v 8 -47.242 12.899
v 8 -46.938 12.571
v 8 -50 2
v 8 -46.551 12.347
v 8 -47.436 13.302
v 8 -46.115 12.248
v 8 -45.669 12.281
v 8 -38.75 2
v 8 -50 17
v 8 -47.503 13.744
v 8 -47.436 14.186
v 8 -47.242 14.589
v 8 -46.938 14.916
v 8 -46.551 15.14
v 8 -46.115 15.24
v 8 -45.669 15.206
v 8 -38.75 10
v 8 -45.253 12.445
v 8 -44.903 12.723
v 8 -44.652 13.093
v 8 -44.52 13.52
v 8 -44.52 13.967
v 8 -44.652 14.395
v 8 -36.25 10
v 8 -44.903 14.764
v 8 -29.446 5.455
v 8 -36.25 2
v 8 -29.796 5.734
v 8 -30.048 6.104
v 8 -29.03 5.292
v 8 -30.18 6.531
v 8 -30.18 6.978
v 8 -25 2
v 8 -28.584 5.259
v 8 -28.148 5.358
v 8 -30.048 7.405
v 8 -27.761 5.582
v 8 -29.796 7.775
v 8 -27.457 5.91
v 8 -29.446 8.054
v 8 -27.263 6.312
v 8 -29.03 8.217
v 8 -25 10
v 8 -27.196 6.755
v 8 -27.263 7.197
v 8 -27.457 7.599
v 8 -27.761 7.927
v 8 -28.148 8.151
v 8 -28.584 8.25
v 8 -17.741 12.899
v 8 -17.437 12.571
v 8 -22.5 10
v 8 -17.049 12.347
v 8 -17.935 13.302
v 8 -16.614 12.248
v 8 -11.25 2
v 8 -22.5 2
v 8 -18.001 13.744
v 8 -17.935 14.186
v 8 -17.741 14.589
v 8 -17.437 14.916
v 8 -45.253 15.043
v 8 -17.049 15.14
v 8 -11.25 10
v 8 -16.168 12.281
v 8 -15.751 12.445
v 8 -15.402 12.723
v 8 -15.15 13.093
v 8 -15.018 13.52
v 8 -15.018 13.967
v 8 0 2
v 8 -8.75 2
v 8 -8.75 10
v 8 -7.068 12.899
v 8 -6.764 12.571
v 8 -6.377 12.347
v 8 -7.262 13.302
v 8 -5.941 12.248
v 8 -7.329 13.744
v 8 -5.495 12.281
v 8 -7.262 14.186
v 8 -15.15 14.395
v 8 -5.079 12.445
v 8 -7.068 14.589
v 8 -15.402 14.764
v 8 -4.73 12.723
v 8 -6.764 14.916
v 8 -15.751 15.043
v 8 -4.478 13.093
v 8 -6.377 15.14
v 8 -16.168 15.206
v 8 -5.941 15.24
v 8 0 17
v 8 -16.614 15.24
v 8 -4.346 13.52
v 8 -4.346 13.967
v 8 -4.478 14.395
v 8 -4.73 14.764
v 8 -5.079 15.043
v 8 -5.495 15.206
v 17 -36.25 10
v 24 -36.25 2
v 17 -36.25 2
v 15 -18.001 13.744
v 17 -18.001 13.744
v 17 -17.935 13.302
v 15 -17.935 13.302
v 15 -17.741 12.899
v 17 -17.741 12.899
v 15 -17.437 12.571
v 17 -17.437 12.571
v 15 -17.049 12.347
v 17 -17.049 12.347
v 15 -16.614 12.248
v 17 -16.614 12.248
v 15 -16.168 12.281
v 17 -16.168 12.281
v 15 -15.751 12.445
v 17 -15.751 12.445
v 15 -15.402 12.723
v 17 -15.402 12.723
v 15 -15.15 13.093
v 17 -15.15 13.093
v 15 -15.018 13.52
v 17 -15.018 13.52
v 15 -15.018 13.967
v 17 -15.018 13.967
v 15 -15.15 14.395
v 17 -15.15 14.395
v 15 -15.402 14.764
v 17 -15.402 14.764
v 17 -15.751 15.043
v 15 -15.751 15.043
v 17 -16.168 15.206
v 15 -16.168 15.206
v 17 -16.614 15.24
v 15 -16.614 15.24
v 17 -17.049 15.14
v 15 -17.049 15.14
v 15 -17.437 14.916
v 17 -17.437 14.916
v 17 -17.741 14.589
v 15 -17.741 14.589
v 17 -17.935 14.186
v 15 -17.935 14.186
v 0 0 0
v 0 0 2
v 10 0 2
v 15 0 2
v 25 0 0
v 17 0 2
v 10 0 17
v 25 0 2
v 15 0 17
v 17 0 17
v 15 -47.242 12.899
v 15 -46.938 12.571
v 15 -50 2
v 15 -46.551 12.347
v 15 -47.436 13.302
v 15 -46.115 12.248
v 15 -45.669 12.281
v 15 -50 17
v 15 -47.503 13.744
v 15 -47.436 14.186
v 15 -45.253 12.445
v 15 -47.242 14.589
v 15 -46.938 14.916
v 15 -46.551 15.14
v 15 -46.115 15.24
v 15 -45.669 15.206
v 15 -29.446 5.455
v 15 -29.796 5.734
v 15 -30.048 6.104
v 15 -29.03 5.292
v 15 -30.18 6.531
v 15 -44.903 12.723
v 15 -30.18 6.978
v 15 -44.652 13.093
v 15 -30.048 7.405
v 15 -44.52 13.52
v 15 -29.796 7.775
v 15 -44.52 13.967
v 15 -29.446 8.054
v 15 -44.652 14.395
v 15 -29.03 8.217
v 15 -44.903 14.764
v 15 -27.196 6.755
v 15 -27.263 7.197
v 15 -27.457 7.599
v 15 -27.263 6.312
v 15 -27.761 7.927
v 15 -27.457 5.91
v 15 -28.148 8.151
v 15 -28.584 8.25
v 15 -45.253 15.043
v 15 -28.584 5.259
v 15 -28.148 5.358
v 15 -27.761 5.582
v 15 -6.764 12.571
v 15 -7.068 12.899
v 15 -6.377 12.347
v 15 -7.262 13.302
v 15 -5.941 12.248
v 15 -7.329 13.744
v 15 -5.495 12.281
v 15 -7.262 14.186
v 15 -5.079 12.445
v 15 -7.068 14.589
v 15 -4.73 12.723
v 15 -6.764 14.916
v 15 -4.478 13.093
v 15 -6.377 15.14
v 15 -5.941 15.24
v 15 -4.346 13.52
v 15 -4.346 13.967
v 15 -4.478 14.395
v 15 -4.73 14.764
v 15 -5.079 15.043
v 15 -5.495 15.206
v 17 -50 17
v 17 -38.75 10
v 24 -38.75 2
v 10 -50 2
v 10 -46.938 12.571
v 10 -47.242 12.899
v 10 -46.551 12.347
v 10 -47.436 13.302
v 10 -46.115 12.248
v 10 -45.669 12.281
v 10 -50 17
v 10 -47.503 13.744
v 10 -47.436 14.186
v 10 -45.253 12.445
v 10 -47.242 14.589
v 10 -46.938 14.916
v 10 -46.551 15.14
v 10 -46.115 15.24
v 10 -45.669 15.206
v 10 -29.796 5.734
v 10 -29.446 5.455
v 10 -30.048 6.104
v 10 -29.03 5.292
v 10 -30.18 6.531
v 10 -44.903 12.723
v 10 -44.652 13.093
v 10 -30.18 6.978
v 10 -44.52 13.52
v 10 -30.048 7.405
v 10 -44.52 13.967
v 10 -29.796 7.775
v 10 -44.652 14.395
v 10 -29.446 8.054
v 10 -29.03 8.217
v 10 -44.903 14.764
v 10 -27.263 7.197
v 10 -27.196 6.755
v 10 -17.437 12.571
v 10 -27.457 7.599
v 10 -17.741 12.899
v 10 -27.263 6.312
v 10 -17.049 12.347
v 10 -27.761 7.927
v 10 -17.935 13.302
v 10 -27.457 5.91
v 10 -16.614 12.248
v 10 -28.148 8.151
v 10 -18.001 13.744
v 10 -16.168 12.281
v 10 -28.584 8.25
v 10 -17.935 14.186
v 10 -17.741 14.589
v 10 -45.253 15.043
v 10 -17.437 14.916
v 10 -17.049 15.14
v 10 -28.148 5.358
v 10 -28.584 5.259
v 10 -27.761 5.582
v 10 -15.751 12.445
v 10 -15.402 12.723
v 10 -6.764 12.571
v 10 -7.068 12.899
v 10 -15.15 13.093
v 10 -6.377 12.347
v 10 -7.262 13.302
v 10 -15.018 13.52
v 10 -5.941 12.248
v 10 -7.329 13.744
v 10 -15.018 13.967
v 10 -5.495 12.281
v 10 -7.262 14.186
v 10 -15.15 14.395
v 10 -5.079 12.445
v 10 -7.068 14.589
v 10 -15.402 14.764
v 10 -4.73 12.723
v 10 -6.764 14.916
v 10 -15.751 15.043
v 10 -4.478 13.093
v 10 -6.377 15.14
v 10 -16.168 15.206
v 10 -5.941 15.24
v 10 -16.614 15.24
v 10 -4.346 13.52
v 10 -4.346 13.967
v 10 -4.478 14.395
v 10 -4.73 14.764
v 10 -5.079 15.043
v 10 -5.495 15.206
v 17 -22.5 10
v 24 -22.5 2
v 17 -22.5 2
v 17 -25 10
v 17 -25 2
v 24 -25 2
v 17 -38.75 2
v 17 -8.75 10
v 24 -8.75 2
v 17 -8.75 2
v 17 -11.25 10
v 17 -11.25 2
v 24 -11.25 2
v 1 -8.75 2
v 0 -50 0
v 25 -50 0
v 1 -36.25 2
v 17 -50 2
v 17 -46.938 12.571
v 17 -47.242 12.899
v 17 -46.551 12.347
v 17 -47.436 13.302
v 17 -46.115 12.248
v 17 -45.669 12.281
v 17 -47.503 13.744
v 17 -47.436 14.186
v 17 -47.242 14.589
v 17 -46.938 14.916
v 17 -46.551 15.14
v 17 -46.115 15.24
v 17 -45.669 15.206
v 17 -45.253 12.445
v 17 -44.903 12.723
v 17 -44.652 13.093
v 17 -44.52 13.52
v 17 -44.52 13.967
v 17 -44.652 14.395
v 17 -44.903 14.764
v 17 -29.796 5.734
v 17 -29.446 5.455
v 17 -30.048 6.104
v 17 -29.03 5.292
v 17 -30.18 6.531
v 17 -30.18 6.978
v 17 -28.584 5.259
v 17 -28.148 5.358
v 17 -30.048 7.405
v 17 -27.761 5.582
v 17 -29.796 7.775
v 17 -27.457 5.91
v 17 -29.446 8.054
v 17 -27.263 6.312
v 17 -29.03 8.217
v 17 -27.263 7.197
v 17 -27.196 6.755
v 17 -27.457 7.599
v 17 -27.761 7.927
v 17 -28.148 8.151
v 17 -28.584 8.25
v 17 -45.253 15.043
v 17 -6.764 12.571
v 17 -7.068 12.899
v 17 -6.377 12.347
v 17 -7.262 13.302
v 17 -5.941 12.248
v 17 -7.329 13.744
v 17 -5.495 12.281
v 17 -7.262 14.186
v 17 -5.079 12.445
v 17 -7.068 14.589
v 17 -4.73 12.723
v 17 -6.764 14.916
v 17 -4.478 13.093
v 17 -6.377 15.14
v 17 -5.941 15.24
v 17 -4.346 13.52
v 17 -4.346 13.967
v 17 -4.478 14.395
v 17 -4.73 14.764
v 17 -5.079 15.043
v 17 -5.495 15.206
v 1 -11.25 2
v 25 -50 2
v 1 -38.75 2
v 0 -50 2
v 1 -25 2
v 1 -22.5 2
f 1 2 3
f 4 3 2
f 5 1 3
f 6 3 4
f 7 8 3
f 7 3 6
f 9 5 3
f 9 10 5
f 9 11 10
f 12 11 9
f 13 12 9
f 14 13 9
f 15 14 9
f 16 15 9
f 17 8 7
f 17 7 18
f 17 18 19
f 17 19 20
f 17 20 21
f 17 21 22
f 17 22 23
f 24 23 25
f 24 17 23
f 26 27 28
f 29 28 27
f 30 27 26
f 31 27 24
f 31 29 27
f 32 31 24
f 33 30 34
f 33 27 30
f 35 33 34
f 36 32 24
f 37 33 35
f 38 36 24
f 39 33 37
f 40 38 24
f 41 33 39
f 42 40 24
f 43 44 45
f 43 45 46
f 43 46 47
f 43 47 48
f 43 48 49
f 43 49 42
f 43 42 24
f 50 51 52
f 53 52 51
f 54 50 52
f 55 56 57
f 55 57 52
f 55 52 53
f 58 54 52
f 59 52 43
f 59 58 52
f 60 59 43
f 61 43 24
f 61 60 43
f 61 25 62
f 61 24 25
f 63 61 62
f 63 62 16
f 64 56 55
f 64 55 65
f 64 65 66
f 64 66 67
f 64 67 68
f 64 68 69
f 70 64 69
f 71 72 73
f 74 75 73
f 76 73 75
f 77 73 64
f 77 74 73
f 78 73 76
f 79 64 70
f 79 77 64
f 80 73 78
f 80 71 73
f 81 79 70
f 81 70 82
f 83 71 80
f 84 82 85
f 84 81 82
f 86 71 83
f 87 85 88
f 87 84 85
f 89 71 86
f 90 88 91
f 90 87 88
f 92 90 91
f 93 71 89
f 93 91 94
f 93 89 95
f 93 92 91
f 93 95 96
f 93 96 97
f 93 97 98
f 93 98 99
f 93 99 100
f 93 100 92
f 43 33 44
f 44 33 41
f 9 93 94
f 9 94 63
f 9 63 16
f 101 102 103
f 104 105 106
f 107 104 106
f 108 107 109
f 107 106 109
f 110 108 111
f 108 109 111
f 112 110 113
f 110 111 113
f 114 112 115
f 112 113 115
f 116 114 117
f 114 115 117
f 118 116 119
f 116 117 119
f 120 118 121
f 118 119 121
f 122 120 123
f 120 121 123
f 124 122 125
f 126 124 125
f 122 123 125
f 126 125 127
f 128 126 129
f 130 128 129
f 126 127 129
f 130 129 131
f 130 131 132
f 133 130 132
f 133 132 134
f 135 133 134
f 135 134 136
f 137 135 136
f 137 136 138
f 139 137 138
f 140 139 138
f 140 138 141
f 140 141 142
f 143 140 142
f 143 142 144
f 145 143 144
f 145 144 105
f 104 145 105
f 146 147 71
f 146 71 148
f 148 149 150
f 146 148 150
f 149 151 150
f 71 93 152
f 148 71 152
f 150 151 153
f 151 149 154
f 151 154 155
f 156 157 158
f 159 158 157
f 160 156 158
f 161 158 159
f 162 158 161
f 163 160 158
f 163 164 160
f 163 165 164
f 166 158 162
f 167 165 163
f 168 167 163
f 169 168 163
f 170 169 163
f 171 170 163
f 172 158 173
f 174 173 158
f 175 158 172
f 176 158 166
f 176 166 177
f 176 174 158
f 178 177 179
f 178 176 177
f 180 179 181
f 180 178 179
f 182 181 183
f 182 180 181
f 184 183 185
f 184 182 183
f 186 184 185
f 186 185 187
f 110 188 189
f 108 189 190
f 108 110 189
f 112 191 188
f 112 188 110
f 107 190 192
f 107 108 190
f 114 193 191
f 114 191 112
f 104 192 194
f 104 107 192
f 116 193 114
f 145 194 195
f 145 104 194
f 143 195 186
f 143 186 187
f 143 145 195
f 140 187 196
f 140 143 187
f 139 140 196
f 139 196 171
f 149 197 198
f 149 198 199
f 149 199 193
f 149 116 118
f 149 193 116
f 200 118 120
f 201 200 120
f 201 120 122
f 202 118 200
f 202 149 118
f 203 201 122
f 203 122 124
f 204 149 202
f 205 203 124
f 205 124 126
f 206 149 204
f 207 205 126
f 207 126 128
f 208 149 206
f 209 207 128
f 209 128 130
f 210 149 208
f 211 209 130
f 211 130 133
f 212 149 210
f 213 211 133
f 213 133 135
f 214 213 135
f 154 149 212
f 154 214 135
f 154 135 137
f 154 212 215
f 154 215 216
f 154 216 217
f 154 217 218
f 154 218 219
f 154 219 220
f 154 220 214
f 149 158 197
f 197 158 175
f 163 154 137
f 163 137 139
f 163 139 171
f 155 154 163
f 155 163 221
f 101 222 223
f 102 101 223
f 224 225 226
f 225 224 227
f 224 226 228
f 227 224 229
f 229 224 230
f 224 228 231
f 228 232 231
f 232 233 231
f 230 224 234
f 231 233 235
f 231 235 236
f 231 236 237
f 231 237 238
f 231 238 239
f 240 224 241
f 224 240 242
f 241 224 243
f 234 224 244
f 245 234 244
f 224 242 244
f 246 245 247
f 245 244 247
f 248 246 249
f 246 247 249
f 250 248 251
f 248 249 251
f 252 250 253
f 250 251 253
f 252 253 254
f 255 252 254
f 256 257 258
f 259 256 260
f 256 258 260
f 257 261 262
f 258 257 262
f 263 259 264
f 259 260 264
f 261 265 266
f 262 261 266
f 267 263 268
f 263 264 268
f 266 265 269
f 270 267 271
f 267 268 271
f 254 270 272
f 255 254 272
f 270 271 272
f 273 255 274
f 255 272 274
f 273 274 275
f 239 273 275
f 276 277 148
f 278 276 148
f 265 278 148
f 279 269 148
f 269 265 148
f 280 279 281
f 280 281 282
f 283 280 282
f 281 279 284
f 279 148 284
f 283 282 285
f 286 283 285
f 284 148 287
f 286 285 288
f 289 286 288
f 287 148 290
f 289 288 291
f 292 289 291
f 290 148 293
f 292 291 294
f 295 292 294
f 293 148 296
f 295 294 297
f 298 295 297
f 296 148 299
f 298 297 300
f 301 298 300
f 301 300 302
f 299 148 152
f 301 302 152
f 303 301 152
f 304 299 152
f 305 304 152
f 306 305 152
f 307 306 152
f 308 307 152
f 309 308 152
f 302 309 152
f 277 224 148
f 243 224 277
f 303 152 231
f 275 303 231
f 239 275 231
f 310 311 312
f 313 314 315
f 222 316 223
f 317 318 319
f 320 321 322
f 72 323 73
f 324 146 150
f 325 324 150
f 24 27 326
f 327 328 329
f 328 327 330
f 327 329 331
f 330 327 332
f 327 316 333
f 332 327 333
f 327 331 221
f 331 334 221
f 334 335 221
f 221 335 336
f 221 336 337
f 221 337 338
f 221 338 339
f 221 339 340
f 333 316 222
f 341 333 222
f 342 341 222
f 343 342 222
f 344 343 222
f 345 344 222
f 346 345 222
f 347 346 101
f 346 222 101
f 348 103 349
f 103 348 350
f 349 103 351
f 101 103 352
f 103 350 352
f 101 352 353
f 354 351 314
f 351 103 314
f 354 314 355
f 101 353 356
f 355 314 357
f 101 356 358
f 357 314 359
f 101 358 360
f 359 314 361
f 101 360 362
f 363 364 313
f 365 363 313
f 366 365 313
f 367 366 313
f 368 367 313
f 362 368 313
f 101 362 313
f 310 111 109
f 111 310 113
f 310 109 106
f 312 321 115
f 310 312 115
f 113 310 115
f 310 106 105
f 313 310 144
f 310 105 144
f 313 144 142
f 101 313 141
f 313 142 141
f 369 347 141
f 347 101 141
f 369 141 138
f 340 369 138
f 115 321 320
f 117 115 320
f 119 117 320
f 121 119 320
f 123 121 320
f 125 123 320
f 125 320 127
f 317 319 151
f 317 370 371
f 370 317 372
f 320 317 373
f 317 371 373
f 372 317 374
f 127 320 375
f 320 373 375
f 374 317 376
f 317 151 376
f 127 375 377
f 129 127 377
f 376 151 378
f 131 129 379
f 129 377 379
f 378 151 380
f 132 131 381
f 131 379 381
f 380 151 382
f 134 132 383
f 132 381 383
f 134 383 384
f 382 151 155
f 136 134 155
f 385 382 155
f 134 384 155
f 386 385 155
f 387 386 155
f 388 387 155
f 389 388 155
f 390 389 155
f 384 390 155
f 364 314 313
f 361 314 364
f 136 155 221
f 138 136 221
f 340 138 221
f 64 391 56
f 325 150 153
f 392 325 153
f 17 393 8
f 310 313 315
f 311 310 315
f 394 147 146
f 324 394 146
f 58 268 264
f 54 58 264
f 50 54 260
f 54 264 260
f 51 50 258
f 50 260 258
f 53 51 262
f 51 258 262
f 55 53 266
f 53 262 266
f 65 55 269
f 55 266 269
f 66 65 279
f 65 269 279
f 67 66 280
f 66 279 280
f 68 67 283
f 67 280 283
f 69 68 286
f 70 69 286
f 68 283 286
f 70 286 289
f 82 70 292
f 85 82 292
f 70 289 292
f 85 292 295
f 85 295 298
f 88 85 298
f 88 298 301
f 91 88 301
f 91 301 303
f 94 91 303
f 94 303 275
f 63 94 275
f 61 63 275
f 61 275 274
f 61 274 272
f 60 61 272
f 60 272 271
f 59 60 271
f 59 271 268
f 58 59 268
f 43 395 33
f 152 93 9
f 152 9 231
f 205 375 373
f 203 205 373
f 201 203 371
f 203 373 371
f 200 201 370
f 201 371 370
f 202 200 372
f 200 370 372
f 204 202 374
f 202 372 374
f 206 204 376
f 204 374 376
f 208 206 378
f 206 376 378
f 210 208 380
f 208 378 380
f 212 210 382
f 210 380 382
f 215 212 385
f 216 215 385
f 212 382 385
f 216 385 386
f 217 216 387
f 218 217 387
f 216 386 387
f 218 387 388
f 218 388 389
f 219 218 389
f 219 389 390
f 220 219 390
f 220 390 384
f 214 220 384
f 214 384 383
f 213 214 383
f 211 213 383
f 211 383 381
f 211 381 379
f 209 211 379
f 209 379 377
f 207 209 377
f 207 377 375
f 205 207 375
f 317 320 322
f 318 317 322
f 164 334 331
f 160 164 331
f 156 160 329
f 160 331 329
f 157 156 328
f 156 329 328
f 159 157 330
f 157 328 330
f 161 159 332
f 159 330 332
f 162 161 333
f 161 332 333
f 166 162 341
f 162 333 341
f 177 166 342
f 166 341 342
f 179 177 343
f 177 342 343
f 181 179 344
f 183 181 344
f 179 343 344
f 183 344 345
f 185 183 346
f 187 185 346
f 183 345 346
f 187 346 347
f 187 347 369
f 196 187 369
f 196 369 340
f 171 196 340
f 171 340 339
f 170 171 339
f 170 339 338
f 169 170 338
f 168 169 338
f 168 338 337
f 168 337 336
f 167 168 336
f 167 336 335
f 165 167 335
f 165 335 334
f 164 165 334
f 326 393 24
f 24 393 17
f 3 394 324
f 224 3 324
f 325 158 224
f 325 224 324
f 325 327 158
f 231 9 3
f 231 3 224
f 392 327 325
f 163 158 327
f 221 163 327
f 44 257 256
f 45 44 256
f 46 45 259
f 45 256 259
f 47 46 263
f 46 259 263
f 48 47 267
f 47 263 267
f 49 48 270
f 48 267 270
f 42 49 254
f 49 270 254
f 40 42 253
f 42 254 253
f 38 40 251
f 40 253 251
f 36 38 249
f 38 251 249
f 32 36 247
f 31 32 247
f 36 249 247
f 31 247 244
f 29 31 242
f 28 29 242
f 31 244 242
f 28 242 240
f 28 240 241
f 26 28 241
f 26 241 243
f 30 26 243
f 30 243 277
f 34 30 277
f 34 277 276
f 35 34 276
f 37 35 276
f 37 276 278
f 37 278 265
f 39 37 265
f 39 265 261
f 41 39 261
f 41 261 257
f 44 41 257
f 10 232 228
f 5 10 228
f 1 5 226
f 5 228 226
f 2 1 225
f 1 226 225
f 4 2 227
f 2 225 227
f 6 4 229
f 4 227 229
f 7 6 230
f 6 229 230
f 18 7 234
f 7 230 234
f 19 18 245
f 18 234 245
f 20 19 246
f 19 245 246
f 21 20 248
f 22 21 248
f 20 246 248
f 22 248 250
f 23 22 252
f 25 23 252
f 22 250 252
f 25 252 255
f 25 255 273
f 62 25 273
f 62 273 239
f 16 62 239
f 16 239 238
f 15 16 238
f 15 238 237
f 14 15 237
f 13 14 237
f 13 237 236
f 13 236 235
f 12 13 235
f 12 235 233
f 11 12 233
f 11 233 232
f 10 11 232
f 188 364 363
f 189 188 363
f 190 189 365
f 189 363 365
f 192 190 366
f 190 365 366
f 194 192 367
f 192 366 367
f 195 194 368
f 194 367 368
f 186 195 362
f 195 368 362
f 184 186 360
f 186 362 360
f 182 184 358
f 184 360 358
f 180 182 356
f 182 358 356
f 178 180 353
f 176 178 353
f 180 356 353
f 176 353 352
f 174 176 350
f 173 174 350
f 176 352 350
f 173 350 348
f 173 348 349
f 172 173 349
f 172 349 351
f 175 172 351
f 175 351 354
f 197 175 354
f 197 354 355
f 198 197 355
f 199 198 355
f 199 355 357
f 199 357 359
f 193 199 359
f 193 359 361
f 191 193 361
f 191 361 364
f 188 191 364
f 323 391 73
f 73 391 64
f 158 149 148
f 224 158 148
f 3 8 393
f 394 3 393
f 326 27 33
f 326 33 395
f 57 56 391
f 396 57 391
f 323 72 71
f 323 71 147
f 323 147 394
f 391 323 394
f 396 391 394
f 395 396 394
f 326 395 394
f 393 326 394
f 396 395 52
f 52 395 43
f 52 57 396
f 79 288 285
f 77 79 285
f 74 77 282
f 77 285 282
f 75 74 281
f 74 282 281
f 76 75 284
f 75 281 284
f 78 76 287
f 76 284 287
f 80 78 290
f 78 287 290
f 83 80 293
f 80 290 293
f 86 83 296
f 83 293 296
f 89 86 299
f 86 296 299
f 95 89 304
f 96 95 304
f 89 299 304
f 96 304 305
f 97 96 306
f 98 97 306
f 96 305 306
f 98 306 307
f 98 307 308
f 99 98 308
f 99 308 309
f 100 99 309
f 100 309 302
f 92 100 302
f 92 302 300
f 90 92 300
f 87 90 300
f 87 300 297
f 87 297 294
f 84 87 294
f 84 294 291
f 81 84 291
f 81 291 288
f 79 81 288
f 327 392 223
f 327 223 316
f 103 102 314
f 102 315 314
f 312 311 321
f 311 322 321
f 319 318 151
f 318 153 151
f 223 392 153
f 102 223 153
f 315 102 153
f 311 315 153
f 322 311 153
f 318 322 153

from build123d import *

# Parameters (mm, degrees)
F0_W     = 2
F0_H     = 15
F1_DEPTH = 50
F2_W     = 8
F2_H     = 2.5
F3_DEPTH = 15
F5_DEPTH = 100
F7_DEPTH = 34.4
F8_R     = 1.5
F9_DEPTH = 9


with BuildPart() as f1:
    # F0 (on Front) → F1 (new body)
    with BuildSketch(Plane.XZ):
        Polygon((12.5, 2), (12.5, 1), (15, 2), align=None)
        Polygon((0, 2), (0, 0), (10, 0), (12.5, 1), (10, 2), (8, 2), align=None)
        with Locations((9, 9.5)):
            Rectangle(F0_W, F0_H)
        Polygon((10, 2), (12.5, 1), (12.5, 2), align=None)
        Polygon((12.5, 1), (15, 0), (15, 2), align=None)
        with Locations((16, 9.5)):
            Rectangle(F0_W, F0_H)
        Polygon((15, 2), (15, 0), (25, 0), (25, 2), (17, 2), align=None)
        Polygon((12.5, 1), (10, 0), (15, 0), align=None)
    extrude(amount=F1_DEPTH)

    # F2 (on face) → F3 (join, through all)
    with BuildSketch(Plane.XY.offset(2)):
        Polygon((21, -11.25), (25, -11.25), (25, -8.75), (17, -8.75), (17, -11.25), align=None)
        Polygon((17, -25), (25, -25), (25, -23.75), (25, -22.5), (17, -22.5), align=None)
        Polygon((25, -36.25), (21, -36.25), (17, -36.25), (17, -38.75), (25, -38.75), align=None)
        Polygon((0, -25), (8, -25), (8, -22.5), (0, -22.5), (0, -23.75), align=None)
        Polygon((0, -36.25), (0, -38.75), (8, -38.75), (8, -36.25), (4, -36.25), align=None)
        with Locations((4, -10)):
            Rectangle(F2_W, F2_H)
    extrude(amount=F3_DEPTH)

    # F4 (on face) → F5 (cut)
    with BuildSketch(Plane.XZ.offset(38.75)):
        Polygon((0, 17), (0, 2), (1, 2), (8, 10), (8, 17), align=None)
    extrude(amount=-F5_DEPTH, mode=Mode.SUBTRACT)

    # F6 (on face) → F7 (cut)
    with BuildSketch(Plane.XZ.offset(38.75)):
        Polygon((17, 10), (24, 2), (25, 2), (25, 17), (17, 17), align=None)
    extrude(amount=-F7_DEPTH, mode=Mode.SUBTRACT)

    # F8 (on face) → F9 (cut, through all)
    with BuildSketch(Plane.YZ.offset(17)):
        with BuildLine():
            Line((-46.0029848111, 13.7437408806), (-44.5029848111, 13.7437408806))
            ThreePointArc((-44.5029848111, 13.7437408806), (-46.0029848111, 15.2437408806), (-47.5029848111, 13.7437408806))
            Line((-47.5029848111, 13.7437408806), (-46.0029848111, 13.7437408806))
        make_face()
        with BuildLine():
            ThreePointArc((-47.5029848111, 13.7437408806), (-46.0029848111, 12.2437408806), (-44.5029848111, 13.7437408806))
            Line((-44.5029848111, 13.7437408806), (-46.0029848111, 13.7437408806))
            Line((-46.0029848111, 13.7437408806), (-47.5029848111, 13.7437408806))
        make_face()
        with BuildLine():
            ThreePointArc((-4.3291251771, 13.7437408806), (-5.8291251771, 15.2437408806), (-7.3291251771, 13.7437408806))
            Line((-7.3291251771, 13.7437408806), (-4.3291251771, 13.7437408806))
        make_face()
        with BuildLine():
            Line((-4.3291251771, 13.7437408806), (-7.3291251771, 13.7437408806))
            ThreePointArc((-7.3291251771, 13.7437408806), (-5.8291251771, 12.2437408806), (-4.3291251771, 13.7437408806))
        make_face()
        with BuildLine():
            ThreePointArc((-15.0014732629, 13.7437408806), (-16.5014732629, 15.2437408806), (-18.0014732629, 13.7437408806))
            Line((-18.0014732629, 13.7437408806), (-16.5014732629, 13.7437408806))
            Line((-16.5014732629, 13.7437408806), (-15.0014732629, 13.7437408806))
        make_face()
        with BuildLine():
            Line((-16.5014732629, 13.7437408806), (-18.0014732629, 13.7437408806))
            ThreePointArc((-18.0014732629, 13.7437408806), (-16.5014732629, 12.2437408806), (-15.0014732629, 13.7437408806))
            Line((-15.0014732629, 13.7437408806), (-16.5014732629, 13.7437408806))
        make_face()
        with Locations((-28.6963357897, 6.7545174172)):
            Circle(F8_R)
    extrude(amount=-F9_DEPTH, mode=Mode.SUBTRACT)


solid = f1.part
